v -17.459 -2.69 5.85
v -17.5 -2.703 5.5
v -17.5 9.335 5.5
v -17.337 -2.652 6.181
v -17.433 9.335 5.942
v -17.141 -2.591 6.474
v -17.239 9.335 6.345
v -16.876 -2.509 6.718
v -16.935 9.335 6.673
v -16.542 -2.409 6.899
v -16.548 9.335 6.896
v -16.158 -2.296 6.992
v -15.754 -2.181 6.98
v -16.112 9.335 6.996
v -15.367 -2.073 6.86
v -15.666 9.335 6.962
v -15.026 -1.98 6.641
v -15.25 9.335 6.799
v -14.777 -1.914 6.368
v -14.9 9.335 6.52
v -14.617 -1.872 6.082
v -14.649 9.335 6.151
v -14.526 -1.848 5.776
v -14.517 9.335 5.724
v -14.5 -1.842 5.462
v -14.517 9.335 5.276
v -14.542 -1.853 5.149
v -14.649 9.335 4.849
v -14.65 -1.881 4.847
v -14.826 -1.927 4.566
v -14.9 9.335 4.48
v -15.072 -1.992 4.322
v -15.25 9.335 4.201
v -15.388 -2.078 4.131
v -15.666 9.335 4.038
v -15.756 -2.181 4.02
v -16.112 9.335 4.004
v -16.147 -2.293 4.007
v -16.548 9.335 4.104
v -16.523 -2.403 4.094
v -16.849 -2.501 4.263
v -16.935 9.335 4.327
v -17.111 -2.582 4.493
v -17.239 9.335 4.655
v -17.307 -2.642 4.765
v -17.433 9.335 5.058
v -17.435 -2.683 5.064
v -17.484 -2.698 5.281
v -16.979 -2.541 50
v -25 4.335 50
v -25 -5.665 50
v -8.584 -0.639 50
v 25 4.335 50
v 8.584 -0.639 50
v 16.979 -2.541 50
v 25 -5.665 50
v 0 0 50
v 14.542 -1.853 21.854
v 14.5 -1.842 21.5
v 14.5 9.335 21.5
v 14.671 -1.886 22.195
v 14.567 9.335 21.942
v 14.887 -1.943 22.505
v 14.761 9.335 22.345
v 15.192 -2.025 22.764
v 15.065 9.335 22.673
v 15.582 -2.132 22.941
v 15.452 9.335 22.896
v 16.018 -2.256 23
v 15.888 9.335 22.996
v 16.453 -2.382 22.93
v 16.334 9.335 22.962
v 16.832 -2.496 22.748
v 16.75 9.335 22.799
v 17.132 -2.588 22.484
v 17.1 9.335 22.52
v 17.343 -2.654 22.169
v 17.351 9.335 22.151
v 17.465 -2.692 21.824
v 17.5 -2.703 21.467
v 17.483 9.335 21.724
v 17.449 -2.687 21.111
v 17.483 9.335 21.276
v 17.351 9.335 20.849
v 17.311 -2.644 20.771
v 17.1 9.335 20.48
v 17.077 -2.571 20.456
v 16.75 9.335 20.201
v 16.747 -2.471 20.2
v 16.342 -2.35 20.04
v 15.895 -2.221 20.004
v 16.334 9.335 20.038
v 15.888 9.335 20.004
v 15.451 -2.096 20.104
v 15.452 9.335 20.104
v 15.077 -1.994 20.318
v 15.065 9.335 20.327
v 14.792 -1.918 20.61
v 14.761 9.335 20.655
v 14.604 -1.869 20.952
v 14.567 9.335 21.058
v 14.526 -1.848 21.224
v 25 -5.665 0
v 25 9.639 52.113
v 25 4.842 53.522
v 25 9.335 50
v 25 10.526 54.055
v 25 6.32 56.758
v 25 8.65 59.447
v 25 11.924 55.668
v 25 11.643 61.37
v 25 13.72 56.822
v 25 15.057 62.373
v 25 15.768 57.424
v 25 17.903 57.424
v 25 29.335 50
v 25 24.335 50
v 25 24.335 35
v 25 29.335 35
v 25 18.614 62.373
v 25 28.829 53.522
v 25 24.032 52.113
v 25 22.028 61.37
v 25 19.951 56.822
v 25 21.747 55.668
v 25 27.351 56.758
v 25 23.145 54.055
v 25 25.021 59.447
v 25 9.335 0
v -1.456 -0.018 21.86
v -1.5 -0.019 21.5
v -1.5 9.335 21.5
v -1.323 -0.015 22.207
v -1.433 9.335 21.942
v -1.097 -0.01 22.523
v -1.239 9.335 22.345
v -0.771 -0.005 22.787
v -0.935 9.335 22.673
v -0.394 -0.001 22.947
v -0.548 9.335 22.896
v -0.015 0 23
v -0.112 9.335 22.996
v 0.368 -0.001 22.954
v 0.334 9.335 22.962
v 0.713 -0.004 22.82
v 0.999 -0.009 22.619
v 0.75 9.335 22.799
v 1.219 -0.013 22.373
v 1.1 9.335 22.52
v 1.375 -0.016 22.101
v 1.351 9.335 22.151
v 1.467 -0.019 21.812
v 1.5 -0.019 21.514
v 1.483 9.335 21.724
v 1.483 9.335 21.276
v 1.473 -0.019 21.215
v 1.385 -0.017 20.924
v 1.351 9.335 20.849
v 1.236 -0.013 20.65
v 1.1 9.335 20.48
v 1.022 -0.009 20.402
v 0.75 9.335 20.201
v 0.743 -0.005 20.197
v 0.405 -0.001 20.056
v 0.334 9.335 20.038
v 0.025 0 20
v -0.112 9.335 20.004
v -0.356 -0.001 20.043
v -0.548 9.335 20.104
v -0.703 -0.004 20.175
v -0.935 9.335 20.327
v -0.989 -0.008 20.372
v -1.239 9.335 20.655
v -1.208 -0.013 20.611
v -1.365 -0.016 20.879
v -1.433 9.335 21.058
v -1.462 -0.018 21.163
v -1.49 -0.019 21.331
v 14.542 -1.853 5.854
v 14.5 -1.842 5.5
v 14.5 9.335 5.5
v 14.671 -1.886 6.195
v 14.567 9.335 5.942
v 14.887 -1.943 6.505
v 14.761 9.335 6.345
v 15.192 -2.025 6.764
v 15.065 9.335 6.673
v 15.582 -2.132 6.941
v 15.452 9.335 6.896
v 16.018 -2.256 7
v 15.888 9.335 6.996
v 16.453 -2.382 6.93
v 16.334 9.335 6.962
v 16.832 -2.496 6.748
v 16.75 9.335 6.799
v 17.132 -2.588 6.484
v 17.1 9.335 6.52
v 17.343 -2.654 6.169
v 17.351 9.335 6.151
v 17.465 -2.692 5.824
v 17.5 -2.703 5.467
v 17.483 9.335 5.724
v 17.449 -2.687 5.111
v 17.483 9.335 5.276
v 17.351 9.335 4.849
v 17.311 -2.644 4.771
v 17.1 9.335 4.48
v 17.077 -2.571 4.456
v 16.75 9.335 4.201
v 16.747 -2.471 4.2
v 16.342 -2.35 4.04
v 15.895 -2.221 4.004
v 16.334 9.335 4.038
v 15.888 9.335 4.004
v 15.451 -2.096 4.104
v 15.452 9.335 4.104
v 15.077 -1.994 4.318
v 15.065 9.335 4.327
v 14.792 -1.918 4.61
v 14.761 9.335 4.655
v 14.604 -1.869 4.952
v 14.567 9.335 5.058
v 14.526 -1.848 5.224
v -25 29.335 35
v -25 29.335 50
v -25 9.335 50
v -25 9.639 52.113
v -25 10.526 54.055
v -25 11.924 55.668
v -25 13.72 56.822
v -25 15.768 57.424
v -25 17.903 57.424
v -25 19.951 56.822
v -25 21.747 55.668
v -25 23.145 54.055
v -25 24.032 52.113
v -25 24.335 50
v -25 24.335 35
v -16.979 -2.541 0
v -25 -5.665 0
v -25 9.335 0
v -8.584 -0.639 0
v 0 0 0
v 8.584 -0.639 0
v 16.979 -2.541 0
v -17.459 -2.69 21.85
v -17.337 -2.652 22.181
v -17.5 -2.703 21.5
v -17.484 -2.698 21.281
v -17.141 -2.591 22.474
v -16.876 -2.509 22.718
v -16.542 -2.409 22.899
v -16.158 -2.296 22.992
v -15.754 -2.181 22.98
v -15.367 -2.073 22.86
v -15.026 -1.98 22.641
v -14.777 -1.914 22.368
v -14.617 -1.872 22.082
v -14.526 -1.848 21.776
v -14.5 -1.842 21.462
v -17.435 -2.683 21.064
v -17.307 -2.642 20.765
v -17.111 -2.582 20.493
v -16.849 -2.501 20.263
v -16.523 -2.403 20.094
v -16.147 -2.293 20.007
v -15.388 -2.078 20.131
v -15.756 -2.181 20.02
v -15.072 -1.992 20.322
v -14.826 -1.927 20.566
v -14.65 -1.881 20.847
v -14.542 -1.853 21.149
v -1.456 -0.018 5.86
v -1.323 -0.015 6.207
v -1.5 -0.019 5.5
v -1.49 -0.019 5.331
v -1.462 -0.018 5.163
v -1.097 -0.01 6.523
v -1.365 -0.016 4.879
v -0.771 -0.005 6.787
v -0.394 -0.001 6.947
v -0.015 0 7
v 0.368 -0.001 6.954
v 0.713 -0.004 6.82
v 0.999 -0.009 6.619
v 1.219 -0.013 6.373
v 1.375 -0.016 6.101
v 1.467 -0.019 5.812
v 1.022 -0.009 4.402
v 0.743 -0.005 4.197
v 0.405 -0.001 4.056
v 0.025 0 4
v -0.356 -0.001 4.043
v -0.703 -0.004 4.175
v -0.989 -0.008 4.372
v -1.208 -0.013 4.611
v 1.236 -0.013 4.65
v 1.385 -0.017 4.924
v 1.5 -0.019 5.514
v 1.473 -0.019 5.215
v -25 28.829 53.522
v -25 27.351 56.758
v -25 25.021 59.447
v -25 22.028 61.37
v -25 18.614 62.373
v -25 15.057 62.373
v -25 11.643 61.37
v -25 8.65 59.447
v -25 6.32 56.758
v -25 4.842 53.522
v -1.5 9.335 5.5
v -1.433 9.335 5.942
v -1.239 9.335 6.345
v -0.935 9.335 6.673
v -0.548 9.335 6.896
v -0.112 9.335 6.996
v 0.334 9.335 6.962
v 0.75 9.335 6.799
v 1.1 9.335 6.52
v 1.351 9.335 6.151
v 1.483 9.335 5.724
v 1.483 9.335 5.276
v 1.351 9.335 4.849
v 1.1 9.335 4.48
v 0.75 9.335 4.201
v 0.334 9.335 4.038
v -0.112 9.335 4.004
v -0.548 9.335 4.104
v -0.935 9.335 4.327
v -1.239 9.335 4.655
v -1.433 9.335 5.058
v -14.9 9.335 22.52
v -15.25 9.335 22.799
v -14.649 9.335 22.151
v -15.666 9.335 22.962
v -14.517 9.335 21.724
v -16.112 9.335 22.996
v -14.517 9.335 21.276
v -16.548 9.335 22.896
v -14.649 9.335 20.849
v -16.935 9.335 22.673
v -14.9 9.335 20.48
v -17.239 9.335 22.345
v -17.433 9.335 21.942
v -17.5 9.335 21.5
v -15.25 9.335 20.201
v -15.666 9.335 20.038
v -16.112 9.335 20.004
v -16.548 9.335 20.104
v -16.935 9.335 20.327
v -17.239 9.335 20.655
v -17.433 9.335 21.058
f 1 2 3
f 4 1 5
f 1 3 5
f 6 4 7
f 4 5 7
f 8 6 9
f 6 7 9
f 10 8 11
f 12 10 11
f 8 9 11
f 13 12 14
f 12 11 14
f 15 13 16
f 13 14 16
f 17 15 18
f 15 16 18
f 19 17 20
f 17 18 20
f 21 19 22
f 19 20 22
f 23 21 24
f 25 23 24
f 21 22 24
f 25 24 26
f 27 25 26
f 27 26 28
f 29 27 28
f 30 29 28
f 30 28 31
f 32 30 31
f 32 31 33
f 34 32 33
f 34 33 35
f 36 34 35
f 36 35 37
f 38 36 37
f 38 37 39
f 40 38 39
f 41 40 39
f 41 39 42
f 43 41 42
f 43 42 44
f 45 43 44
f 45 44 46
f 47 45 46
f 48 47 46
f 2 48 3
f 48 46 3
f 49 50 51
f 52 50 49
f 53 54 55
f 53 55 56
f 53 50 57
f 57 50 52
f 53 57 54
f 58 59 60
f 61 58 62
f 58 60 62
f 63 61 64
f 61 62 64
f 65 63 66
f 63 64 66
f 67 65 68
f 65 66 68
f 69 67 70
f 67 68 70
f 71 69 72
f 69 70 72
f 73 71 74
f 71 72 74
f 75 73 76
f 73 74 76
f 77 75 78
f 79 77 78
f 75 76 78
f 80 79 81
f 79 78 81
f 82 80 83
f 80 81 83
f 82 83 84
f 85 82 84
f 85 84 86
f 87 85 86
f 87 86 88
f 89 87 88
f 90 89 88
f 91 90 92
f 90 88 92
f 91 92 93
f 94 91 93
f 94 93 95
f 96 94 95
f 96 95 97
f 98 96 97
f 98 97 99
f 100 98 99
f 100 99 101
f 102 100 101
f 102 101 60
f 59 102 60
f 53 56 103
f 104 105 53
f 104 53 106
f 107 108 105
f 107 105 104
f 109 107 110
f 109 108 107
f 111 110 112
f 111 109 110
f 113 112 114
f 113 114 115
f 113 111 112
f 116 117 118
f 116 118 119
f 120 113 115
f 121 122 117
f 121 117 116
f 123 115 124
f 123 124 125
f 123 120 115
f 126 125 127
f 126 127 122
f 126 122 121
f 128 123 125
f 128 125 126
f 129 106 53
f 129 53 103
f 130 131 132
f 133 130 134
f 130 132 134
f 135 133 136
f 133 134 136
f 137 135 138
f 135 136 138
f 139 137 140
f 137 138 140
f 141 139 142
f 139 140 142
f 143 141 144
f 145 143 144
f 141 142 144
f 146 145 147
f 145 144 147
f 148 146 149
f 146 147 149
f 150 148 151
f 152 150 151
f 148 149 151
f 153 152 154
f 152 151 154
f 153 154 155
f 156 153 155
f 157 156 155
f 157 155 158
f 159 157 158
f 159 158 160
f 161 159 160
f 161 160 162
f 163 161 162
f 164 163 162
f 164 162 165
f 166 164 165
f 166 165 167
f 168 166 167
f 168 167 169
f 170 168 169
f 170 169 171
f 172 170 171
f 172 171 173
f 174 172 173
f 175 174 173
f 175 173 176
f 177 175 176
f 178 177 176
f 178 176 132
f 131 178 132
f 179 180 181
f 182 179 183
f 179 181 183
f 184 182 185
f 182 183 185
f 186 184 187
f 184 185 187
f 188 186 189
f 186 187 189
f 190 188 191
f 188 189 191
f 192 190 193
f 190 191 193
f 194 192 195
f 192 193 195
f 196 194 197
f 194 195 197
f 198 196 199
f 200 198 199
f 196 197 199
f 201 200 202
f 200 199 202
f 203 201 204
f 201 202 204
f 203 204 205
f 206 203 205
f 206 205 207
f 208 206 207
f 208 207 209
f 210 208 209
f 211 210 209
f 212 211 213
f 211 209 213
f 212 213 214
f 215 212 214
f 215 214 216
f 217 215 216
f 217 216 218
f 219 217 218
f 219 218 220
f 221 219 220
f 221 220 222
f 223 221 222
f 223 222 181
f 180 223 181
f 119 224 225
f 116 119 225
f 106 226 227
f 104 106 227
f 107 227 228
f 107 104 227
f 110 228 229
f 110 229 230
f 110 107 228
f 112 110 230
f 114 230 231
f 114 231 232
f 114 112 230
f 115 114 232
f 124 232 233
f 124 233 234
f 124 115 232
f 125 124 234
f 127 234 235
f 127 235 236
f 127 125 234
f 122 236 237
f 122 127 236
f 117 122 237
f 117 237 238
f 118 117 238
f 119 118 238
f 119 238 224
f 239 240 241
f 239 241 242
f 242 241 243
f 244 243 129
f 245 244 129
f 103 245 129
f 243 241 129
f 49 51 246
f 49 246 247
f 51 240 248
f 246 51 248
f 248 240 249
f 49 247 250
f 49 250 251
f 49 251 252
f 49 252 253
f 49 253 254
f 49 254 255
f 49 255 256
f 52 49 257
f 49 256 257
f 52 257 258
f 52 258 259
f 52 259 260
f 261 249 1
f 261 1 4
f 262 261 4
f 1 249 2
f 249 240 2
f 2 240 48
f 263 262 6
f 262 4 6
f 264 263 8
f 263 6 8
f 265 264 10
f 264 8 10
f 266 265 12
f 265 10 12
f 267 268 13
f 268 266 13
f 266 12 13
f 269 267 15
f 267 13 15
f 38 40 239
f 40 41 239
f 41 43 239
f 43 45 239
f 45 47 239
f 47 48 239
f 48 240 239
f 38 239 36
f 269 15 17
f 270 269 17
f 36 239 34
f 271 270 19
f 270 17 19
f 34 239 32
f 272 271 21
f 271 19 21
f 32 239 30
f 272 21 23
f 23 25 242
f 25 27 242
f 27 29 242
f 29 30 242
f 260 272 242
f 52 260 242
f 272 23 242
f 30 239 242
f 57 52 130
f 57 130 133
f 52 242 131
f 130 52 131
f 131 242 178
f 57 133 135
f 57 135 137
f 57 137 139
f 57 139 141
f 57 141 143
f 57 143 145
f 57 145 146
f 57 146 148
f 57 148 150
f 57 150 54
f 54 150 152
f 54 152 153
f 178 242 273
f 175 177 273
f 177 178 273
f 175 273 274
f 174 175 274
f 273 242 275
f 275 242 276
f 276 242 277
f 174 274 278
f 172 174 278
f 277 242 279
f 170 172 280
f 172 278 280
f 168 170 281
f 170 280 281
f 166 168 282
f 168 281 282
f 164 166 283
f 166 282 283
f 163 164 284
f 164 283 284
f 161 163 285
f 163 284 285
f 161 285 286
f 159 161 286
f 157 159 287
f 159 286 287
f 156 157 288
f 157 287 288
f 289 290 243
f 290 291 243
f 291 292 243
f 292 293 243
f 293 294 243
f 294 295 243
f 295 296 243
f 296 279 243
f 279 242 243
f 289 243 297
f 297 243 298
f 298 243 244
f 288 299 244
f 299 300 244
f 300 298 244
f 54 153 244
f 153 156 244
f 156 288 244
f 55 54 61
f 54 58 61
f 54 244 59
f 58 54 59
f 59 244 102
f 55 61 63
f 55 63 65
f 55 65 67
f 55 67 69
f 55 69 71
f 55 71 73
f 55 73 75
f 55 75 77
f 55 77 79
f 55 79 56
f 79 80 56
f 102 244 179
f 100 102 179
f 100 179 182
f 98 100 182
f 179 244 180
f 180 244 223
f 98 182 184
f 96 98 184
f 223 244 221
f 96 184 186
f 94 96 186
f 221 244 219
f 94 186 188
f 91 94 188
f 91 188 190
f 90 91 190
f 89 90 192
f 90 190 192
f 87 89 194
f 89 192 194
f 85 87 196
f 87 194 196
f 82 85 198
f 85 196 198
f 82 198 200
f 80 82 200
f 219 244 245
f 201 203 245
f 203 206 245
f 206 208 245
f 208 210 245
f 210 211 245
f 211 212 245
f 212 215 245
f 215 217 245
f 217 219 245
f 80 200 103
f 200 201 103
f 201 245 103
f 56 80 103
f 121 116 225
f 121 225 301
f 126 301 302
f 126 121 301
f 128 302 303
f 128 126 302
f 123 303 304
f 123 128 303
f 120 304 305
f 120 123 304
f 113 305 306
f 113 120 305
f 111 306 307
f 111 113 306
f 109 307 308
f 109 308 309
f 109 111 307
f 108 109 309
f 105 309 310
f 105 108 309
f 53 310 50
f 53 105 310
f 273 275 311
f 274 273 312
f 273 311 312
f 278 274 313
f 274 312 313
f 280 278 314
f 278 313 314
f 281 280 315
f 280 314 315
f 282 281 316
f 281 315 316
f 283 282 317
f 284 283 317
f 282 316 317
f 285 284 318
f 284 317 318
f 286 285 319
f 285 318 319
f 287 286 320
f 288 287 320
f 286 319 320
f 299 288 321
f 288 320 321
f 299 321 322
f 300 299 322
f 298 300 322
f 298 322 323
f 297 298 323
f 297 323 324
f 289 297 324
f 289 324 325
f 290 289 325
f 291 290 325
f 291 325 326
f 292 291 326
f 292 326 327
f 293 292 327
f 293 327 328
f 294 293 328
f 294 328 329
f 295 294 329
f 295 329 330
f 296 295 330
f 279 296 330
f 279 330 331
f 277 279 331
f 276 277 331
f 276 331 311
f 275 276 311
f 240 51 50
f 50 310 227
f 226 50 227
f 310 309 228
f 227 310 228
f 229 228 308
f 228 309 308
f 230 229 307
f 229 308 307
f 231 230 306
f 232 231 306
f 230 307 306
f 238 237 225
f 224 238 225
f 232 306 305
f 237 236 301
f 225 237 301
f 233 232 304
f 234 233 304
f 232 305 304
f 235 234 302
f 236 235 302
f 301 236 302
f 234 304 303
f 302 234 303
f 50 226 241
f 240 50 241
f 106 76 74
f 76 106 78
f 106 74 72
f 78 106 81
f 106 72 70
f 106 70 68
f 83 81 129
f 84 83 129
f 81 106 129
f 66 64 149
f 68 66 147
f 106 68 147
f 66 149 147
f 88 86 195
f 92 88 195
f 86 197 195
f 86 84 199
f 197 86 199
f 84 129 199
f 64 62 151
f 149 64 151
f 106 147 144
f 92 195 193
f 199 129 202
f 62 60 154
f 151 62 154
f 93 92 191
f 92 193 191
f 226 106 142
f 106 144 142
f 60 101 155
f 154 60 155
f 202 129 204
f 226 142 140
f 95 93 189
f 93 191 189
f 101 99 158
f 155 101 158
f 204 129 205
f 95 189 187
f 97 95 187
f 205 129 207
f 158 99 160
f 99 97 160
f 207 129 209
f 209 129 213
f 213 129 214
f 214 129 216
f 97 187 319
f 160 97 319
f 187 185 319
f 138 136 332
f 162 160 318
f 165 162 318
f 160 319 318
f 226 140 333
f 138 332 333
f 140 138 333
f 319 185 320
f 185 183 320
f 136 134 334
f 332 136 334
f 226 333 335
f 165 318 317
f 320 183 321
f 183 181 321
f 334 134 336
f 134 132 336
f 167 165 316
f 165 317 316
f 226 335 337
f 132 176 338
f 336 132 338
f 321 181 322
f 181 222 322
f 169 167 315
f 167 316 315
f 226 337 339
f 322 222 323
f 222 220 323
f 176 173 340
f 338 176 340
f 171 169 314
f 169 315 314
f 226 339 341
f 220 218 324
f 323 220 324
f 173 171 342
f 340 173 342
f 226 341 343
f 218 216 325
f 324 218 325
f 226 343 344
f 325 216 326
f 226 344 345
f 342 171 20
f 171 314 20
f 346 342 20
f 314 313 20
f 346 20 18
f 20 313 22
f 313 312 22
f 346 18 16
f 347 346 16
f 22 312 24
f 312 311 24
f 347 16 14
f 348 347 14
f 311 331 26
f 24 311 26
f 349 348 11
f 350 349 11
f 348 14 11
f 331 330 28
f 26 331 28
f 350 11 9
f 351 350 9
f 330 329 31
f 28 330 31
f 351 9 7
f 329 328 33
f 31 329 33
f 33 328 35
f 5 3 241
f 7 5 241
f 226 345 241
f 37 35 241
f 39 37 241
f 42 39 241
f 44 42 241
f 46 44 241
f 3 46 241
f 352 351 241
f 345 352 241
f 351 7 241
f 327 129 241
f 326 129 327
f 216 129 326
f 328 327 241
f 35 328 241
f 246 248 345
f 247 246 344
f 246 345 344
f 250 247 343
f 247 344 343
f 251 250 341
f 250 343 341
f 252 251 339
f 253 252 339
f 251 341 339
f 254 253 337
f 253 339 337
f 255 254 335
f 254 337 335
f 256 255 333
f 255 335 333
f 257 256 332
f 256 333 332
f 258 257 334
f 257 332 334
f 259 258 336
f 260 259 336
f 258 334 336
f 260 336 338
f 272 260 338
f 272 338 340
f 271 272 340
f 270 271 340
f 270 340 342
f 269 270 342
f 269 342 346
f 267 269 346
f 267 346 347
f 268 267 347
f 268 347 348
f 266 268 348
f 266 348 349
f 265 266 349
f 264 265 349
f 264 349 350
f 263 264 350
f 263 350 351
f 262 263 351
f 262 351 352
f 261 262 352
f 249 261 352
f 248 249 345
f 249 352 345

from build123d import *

# Parameters (mm, degrees)
F1_DEPTH = 50
F3_DEPTH = 50
F4_R     = 1.5
F5_DEPTH = 15.001


with BuildPart() as f1:
    # F0 (on Top) → F1 (new body)
    with BuildSketch(Plane.XY):
        with BuildLine():
            ThreePointArc((-25, -5.664544), (0, 0), (25, -5.664544))
            Line((25, -5.664544), (25, 9.335456))
            Line((25, 9.335456), (-25, 9.335456))
            Line((-25, 9.335456), (-25, -5.664544))
        make_face()
    extrude(amount=F1_DEPTH)

    # F2 (on face) → F3 (join, through all)
    with BuildSketch(Plane.YZ.offset(25)):
        with BuildLine():
            ThreePointArc((9.335456, 50), (16.835456, 57.5), (24.335456, 50))
            Line((24.335456, 50), (24.335456, 35))
            Line((24.335456, 35), (29.335456, 35))
            Line((29.335456, 35), (29.335456, 50))
            ThreePointArc((29.335456, 50), (16.835456, 62.5), (4.335456, 50))
            Line((4.335456, 50), (9.335456, 50))
        make_face()
    extrude(amount=-F3_DEPTH)

    # F4 (on face) → F5 (cut, through all)
    with BuildSketch(Plane(origin=(0, 9.335456, 0), x_dir=(-1, 0, 0), z_dir=(0, 1, 0))):
        with Locations((-16, 21.5)):
            Circle(F4_R)
        with Locations((0, 21.5)):
            Circle(F4_R)
        with Locations((16, 21.5)):
            Circle(F4_R)
        with Locations((16, 5.5)):
            Circle(F4_R)
        with Locations((0, 5.5)):
            Circle(F4_R)
        with Locations((-16, 5.5)):
            Circle(F4_R)
    extrude(amount=-F5_DEPTH, mode=Mode.SUBTRACT)


solid = f1.part
